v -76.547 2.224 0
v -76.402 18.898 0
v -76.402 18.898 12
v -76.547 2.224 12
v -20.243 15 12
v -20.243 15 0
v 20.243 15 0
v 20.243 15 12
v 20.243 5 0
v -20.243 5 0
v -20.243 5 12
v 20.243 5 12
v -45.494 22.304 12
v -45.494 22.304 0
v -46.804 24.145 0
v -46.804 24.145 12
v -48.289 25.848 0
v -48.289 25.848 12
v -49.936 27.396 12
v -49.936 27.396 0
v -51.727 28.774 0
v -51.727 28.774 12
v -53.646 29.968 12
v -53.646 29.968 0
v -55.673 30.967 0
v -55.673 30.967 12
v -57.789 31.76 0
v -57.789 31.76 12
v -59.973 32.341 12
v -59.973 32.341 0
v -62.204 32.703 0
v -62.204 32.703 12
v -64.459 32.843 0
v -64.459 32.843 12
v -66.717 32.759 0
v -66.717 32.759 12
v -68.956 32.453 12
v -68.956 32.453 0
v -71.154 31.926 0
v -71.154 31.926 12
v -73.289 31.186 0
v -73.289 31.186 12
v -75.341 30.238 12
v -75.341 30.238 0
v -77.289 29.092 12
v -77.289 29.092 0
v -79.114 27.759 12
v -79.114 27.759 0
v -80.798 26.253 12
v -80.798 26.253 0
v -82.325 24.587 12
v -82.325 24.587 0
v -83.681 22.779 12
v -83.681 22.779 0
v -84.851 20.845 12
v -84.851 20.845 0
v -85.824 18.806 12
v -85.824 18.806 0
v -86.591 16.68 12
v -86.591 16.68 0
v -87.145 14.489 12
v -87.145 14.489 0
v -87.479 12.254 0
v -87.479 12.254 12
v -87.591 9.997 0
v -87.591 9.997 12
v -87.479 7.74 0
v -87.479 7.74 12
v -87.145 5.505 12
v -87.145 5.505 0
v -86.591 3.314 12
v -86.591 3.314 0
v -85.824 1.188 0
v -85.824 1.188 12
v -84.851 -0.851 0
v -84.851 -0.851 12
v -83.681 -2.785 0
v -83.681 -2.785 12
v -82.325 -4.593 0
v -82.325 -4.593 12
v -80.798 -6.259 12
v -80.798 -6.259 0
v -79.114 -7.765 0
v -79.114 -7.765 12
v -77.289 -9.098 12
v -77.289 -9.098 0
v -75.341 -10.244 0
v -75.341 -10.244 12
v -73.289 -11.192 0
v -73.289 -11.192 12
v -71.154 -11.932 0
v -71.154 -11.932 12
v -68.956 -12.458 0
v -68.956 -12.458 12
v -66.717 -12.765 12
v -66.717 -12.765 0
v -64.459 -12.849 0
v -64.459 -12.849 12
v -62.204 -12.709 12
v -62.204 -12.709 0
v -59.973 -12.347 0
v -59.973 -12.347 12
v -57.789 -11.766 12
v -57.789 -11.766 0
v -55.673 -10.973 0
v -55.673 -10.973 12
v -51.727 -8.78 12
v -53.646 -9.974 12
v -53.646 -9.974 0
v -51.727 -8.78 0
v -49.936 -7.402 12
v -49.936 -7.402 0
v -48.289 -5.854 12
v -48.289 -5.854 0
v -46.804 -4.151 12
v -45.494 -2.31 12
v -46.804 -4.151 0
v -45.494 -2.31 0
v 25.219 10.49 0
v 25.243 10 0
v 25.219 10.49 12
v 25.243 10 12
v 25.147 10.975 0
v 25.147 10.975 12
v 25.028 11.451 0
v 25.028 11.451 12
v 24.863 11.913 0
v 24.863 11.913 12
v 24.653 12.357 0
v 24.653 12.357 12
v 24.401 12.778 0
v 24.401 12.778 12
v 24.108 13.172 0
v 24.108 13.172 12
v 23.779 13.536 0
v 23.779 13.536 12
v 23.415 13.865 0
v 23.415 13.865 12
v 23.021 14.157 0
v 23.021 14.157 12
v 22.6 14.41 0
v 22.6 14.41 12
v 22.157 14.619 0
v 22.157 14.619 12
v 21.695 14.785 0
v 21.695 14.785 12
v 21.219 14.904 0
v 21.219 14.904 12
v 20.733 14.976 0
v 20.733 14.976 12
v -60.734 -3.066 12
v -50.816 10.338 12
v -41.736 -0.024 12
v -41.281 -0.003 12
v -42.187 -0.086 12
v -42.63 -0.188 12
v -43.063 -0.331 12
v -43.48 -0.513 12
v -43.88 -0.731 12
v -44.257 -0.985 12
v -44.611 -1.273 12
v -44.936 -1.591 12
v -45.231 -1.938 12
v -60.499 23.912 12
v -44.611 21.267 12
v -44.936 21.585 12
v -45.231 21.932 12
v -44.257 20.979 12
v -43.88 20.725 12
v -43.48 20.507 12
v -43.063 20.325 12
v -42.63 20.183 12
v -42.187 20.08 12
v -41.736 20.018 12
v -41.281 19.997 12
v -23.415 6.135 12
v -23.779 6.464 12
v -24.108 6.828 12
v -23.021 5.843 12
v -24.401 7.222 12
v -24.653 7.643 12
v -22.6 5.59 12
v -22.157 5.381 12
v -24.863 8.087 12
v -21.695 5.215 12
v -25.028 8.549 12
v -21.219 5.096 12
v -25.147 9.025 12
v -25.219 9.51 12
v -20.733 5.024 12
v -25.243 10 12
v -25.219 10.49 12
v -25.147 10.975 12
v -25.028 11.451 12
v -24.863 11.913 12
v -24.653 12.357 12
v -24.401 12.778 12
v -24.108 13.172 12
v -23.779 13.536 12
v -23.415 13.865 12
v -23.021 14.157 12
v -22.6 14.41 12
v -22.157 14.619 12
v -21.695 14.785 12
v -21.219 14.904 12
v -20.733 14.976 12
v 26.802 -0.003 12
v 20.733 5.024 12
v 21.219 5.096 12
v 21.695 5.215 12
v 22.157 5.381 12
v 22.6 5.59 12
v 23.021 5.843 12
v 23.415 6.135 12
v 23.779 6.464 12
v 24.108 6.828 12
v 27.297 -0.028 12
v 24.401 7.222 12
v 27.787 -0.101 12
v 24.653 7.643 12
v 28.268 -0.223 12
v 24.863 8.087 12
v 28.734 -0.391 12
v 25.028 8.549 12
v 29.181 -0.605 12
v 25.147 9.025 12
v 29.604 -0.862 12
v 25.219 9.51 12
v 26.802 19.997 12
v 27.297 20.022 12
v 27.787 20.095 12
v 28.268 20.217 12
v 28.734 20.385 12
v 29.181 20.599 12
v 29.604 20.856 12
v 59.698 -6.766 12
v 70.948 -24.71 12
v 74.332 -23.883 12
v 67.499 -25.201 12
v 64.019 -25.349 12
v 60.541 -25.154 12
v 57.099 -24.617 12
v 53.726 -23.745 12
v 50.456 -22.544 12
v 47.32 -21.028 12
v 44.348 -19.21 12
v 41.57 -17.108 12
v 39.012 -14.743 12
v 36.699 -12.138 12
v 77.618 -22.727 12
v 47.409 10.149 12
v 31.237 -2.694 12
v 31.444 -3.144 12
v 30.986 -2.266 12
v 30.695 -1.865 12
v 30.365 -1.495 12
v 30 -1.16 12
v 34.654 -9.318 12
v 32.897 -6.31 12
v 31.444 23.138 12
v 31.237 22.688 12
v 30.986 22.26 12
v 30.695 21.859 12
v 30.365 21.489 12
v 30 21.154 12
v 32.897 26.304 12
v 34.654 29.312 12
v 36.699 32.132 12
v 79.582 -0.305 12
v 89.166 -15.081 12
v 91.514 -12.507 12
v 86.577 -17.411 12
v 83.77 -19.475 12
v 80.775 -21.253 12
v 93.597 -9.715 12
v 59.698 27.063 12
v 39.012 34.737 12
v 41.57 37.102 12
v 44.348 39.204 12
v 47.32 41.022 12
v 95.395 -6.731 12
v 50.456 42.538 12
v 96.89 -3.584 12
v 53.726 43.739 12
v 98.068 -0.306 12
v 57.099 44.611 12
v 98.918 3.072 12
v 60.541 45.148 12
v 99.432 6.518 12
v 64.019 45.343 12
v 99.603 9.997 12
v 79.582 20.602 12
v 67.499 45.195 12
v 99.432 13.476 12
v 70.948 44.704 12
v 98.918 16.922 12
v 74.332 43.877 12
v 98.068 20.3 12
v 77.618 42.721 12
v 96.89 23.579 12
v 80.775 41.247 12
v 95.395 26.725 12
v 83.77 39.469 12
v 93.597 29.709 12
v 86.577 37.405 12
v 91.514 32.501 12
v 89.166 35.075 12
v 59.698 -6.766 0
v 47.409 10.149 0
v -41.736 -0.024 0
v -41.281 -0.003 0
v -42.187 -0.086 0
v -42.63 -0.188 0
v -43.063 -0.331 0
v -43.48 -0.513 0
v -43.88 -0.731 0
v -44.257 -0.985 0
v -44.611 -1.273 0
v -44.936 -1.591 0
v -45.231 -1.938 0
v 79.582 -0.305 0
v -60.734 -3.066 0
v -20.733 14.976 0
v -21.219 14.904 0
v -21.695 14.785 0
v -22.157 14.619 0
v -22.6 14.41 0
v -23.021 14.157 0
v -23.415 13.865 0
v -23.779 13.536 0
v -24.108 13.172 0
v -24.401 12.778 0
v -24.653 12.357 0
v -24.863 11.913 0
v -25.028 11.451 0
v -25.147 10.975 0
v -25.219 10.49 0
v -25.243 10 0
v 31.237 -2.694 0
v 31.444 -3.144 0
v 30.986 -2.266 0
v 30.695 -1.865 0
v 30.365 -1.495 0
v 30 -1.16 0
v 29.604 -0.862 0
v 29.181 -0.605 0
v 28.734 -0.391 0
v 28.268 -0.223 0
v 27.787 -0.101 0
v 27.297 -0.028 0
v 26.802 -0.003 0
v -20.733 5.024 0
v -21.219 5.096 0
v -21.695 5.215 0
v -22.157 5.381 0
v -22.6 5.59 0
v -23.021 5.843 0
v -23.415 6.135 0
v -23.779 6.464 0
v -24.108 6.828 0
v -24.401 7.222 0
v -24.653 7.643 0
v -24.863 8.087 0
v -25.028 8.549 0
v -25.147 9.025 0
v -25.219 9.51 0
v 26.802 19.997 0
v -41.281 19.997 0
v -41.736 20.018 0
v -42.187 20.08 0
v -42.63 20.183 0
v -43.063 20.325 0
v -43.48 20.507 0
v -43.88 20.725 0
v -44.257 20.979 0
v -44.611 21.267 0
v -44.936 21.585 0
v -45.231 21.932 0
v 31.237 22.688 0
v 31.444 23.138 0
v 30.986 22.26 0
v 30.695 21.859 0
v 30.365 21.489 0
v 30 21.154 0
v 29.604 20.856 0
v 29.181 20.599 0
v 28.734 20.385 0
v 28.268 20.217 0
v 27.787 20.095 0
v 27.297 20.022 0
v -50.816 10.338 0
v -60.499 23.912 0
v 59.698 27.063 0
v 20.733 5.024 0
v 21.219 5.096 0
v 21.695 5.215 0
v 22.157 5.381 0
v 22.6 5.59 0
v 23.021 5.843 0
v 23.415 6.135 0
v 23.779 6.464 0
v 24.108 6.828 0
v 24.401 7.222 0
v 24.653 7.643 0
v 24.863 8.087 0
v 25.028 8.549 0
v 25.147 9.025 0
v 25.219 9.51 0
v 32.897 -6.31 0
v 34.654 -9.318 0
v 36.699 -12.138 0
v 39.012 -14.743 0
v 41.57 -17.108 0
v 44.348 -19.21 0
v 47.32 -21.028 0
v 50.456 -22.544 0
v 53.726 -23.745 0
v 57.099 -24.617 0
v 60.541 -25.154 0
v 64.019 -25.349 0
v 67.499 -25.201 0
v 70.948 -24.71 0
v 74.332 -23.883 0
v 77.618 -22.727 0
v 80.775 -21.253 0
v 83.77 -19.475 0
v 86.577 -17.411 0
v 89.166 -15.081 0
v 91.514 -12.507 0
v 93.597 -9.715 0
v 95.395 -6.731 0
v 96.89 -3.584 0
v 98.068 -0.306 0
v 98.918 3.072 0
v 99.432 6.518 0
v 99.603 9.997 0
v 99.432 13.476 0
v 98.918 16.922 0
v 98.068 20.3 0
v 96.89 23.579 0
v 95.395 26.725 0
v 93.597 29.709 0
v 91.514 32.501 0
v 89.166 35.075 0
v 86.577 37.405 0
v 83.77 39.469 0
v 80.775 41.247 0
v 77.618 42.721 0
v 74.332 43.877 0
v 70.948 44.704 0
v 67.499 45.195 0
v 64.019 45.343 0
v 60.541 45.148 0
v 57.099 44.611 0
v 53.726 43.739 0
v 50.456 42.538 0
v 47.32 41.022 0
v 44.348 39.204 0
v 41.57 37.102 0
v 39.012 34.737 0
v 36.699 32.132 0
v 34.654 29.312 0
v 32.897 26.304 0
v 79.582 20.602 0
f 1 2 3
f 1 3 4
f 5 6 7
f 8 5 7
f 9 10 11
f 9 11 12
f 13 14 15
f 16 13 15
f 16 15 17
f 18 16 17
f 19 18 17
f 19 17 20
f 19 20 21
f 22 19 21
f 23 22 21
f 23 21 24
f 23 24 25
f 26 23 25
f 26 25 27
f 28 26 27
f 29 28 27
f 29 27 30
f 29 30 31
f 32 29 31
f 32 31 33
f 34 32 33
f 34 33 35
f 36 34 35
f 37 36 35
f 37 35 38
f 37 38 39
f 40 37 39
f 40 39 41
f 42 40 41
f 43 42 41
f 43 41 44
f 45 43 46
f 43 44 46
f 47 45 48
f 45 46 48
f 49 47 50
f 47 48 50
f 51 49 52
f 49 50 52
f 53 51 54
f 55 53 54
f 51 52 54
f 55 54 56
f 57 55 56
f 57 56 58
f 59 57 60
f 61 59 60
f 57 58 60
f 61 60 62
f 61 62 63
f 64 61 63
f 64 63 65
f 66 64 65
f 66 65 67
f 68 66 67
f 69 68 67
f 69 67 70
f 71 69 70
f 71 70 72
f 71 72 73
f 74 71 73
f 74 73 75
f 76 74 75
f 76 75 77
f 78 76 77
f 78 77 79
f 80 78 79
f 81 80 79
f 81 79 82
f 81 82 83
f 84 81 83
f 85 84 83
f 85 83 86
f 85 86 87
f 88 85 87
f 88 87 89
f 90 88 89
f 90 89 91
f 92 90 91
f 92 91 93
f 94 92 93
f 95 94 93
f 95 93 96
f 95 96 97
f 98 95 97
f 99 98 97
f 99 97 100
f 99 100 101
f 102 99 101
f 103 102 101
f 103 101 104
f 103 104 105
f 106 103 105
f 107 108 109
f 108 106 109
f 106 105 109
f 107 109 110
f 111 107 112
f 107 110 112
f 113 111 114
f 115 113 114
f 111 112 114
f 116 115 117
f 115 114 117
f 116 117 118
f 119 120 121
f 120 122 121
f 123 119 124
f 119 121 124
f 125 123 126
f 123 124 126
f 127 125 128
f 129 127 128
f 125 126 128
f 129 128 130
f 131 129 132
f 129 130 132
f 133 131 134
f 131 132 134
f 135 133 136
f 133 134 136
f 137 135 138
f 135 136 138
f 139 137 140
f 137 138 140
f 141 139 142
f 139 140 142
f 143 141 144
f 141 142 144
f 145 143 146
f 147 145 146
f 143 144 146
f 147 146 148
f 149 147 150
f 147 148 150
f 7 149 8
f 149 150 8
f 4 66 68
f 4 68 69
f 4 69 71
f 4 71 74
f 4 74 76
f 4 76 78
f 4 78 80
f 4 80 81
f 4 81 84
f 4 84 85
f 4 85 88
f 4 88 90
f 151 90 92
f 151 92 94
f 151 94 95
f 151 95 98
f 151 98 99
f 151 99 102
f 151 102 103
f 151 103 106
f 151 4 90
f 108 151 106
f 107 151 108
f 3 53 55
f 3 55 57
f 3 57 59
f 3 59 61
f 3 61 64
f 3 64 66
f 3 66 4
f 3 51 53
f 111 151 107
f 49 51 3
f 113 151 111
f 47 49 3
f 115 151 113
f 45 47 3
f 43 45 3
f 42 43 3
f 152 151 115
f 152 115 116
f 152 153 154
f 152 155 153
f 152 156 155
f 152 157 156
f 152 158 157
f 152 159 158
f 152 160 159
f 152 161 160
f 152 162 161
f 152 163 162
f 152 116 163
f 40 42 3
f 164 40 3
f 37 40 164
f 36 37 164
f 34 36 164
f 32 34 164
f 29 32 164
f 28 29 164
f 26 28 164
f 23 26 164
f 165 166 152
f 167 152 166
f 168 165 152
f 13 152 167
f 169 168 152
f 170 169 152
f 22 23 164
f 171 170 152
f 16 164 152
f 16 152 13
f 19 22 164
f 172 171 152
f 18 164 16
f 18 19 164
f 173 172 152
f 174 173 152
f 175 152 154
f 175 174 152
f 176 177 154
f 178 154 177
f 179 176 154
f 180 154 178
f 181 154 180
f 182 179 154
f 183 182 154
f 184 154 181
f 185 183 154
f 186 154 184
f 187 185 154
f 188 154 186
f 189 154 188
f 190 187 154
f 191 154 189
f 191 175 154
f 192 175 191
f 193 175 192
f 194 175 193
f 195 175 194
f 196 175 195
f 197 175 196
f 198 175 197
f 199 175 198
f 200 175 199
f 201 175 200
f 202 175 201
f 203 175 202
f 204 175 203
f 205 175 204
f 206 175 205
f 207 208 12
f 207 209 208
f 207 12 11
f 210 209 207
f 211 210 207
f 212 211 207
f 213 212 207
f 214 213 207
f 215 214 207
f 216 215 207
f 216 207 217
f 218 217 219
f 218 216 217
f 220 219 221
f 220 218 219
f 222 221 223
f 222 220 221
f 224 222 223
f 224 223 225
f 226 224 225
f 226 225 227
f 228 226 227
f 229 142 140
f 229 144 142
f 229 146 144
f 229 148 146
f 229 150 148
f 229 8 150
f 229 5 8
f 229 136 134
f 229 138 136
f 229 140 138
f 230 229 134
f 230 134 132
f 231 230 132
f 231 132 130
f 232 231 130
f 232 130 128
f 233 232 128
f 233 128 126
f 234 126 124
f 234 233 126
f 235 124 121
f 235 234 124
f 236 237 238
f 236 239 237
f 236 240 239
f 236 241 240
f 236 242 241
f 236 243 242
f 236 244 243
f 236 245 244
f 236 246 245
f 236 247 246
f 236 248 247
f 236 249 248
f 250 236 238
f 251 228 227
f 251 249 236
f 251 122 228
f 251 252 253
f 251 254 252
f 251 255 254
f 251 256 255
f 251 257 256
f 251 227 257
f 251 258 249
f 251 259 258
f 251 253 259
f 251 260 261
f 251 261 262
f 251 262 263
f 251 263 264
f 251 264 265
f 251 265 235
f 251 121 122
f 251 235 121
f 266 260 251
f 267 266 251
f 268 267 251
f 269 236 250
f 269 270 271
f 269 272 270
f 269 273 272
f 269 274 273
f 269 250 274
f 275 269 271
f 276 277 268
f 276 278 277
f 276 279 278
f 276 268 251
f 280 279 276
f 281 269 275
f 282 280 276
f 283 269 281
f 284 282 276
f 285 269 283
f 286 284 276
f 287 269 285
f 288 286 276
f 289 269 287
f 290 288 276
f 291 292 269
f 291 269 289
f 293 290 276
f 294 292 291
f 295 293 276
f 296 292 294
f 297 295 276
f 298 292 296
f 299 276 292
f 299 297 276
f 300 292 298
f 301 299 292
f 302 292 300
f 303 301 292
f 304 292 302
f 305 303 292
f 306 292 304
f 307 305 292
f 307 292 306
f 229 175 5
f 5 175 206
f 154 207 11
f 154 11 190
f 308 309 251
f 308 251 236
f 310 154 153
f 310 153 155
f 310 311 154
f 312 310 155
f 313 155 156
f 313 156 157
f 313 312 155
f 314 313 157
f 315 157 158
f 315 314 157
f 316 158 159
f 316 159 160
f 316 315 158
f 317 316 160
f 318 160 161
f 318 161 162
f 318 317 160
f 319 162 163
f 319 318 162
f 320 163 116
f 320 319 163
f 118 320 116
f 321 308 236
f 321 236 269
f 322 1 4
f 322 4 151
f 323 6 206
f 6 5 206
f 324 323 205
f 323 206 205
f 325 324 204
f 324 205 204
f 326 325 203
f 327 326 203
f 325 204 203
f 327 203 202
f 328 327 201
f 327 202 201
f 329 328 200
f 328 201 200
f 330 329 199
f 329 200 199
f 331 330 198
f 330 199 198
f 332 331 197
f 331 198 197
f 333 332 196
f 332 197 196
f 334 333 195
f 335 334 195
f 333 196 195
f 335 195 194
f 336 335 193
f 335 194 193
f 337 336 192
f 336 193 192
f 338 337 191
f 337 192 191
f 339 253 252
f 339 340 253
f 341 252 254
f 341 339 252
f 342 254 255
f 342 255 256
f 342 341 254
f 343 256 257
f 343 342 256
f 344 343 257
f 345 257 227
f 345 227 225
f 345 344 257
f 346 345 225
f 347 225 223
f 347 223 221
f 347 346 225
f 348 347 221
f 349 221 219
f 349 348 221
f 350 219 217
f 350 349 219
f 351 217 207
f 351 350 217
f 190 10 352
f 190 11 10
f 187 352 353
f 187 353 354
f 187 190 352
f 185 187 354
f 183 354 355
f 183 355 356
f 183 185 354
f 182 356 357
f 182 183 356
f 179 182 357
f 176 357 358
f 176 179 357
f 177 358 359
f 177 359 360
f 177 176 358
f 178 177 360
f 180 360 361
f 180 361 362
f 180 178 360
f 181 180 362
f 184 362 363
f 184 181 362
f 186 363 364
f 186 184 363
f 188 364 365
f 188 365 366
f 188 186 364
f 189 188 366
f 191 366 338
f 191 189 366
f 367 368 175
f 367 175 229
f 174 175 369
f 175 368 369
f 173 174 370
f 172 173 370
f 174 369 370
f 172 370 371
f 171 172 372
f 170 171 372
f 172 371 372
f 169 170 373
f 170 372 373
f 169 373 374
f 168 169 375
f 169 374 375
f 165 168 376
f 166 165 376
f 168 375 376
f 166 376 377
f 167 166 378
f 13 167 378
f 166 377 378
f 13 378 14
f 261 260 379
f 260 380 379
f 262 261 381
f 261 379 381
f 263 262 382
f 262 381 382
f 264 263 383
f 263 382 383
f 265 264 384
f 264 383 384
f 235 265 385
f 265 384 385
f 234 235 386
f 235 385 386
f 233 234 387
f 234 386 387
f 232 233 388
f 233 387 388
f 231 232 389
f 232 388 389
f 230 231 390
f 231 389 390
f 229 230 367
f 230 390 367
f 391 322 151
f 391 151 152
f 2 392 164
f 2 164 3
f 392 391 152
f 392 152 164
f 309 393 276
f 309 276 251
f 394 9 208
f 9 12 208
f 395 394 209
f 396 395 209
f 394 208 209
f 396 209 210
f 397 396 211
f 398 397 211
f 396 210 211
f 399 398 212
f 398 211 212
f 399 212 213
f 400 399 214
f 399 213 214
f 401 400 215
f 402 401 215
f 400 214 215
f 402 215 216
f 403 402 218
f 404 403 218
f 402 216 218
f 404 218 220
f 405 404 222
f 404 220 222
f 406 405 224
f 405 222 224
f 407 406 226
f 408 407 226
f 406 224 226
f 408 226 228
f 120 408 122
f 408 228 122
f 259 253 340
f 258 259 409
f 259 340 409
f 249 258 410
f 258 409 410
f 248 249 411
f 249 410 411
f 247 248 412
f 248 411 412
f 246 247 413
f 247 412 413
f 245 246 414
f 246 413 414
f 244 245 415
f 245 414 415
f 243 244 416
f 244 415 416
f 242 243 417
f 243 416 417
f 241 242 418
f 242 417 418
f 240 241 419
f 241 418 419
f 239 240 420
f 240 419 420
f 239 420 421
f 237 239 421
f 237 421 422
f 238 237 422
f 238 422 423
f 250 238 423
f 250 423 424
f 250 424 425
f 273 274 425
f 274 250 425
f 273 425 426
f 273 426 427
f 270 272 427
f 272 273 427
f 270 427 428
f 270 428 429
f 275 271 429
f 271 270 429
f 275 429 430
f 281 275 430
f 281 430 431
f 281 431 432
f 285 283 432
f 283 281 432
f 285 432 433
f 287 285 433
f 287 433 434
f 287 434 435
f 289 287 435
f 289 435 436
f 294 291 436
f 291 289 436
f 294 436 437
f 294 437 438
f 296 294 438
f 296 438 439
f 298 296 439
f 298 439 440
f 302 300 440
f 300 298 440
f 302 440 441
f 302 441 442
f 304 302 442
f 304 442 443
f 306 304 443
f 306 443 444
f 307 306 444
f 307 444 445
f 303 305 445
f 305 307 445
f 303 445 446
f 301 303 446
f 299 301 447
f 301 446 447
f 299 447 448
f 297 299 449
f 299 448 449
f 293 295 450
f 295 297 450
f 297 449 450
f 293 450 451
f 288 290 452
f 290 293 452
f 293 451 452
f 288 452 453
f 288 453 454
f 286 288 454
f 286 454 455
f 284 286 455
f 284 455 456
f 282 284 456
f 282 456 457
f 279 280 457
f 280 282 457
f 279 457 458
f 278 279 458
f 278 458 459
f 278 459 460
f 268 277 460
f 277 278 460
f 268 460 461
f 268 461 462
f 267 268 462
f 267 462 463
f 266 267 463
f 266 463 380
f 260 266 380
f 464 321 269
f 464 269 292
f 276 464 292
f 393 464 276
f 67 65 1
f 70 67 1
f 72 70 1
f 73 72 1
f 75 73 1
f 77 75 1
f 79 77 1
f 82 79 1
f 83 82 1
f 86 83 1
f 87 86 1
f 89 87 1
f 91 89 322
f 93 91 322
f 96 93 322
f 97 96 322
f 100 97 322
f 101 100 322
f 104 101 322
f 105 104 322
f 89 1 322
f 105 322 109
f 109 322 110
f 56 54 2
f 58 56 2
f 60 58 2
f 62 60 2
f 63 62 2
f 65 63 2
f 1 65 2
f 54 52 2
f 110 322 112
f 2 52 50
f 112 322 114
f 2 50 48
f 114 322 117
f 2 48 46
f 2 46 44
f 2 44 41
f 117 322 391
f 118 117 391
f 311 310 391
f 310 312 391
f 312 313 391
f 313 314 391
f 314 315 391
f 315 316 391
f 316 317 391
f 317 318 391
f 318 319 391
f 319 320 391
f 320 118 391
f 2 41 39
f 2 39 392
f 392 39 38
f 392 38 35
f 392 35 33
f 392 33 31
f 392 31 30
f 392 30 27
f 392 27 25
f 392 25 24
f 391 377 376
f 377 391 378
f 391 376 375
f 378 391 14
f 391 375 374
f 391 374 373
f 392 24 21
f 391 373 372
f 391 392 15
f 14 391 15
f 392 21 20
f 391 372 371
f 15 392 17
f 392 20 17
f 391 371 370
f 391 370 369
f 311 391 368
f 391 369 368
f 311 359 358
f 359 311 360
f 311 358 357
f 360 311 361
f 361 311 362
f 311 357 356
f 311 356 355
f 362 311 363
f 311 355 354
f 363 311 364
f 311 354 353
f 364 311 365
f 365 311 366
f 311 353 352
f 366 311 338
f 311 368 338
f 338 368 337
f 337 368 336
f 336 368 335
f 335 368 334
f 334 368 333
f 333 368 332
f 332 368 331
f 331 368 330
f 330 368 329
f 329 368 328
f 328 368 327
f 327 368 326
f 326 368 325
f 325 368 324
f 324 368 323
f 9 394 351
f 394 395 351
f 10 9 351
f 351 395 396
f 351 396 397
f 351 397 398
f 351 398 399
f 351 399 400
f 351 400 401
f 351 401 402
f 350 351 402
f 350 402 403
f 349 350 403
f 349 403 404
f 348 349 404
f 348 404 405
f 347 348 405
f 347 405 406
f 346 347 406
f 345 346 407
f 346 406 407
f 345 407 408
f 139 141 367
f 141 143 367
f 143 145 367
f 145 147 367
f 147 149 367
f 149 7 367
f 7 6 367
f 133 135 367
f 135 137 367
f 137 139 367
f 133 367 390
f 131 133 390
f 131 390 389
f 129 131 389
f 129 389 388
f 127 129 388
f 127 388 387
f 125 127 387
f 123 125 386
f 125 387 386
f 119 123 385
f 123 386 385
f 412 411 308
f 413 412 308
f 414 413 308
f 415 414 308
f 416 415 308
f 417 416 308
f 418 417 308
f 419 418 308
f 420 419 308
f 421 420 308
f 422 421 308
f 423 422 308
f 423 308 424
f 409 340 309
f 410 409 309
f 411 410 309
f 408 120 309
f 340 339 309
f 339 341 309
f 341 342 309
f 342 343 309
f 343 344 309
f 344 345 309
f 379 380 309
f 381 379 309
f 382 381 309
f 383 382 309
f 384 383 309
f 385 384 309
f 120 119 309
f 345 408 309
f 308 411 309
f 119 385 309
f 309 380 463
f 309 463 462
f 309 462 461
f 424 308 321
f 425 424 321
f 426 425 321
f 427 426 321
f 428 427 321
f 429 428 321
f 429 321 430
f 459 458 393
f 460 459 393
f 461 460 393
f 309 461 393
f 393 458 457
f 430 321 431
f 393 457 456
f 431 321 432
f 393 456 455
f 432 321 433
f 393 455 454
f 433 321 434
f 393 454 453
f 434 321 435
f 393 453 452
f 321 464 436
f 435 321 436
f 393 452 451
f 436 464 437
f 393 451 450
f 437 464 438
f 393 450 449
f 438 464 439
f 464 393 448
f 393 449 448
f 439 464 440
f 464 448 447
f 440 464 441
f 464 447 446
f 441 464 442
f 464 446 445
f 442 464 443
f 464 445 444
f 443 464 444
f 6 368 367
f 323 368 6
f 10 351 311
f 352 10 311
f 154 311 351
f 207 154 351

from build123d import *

# Parameters (mm, degrees)
F0_W      = 129
F0_H      = 20
F1_DEPTH  = 12
F2_R      = 22.8473442097
F4_DEPTH  = 12
F3_R      = 35.3466345688
F5_DEPTH  = 12
F6_W      = 50.4865964812
F6_H      = 10
F7_DEPTH  = 12
F8_DEPTH  = 12
F9_R      = 4.99999
F11_DEPTH = 12
F13_DEPTH = 12
F14_R     = 5


# Not quite as in the source:
# - a fillet or chamfer is up to 0.001 mm smaller than in the source, because OpenCascade refuses the exact size


with BuildPart() as f1:
    # F0 (on Top) → F1 (new body)
    with BuildSketch(Plane.XY):
        with Locations((-0.2432982406, 9.9970398602)):
            Rectangle(F0_W, F0_H)
    extrude(amount=F1_DEPTH)

    # F2 (on Top) → F4 (join)
    with BuildSketch(Plane.XY):
        with Locations((-64.7432982406, 9.9970398602)):
            Circle(F2_R)
    extrude(amount=F4_DEPTH)

    # F3 (on Top) → F5 (join)
    with BuildSketch(Plane.XY):
        with Locations((64.2567017594, 9.9970398602)):
            Circle(F3_R)
    extrude(amount=F5_DEPTH)

    # F6 (on Top) → F7 (join)
    with BuildSketch(Plane.XY):
        with Locations((0, 10)):
            Rectangle(F6_W, F6_H)
    extrude(amount=F7_DEPTH)

    # F6 (on Top) → F8 (cut)
    with BuildSketch(Plane.XY):
        with Locations((0, 10)):
            Rectangle(F6_W, F6_H)
    extrude(amount=F8_DEPTH, mode=Mode.SUBTRACT)

    # F9 (radius 5 in the source; OpenCascade refuses exactly that, so slightly less here)
    f9_edges = [f1.edges().sort_by_distance(p)[0] for p in [
        (-25.243298, 15, 6),
        (25.243298, 15, 6),
        (25.243298, 5, 6),
        (-25.243298, 5, 6),
    ]]
    fillet(f9_edges, radius=F9_R)

    # F10 (on face) → F11 (cut)
    with BuildSketch(Plane.XY):
        Polygon((-60.7340801705, -3.0663675243), (-50.8161764394, 10.3375567669), (-60.499265179, 23.9120841357), (-76.4016468673, 18.8976791396), (-76.5467705132, 2.2240790499), align=None)
    extrude(amount=F11_DEPTH, mode=Mode.SUBTRACT)

    # F12 (on face) → F13 (cut)
    with BuildSketch(Plane.XY):
        Polygon((79.5819759369, -0.3051165918), (79.5819759369, 20.6023402938), (59.6978028267, 27.0630997807), (47.4087080063, 10.148611851), (59.6978028267, -6.7658760786), align=None)
    extrude(amount=F13_DEPTH, mode=Mode.SUBTRACT)

    # F14
    f14_edges = [f1.edges().sort_by_distance(p)[0] for p in [
        (-44.200632, -0.00296, 6),
        (30.354127, -0.00296, 6),
        (30.354127, 19.99704, 6),
        (-44.200632, 19.99704, 6),
    ]]
    fillet(f14_edges, radius=F14_R)


solid = f1.part
